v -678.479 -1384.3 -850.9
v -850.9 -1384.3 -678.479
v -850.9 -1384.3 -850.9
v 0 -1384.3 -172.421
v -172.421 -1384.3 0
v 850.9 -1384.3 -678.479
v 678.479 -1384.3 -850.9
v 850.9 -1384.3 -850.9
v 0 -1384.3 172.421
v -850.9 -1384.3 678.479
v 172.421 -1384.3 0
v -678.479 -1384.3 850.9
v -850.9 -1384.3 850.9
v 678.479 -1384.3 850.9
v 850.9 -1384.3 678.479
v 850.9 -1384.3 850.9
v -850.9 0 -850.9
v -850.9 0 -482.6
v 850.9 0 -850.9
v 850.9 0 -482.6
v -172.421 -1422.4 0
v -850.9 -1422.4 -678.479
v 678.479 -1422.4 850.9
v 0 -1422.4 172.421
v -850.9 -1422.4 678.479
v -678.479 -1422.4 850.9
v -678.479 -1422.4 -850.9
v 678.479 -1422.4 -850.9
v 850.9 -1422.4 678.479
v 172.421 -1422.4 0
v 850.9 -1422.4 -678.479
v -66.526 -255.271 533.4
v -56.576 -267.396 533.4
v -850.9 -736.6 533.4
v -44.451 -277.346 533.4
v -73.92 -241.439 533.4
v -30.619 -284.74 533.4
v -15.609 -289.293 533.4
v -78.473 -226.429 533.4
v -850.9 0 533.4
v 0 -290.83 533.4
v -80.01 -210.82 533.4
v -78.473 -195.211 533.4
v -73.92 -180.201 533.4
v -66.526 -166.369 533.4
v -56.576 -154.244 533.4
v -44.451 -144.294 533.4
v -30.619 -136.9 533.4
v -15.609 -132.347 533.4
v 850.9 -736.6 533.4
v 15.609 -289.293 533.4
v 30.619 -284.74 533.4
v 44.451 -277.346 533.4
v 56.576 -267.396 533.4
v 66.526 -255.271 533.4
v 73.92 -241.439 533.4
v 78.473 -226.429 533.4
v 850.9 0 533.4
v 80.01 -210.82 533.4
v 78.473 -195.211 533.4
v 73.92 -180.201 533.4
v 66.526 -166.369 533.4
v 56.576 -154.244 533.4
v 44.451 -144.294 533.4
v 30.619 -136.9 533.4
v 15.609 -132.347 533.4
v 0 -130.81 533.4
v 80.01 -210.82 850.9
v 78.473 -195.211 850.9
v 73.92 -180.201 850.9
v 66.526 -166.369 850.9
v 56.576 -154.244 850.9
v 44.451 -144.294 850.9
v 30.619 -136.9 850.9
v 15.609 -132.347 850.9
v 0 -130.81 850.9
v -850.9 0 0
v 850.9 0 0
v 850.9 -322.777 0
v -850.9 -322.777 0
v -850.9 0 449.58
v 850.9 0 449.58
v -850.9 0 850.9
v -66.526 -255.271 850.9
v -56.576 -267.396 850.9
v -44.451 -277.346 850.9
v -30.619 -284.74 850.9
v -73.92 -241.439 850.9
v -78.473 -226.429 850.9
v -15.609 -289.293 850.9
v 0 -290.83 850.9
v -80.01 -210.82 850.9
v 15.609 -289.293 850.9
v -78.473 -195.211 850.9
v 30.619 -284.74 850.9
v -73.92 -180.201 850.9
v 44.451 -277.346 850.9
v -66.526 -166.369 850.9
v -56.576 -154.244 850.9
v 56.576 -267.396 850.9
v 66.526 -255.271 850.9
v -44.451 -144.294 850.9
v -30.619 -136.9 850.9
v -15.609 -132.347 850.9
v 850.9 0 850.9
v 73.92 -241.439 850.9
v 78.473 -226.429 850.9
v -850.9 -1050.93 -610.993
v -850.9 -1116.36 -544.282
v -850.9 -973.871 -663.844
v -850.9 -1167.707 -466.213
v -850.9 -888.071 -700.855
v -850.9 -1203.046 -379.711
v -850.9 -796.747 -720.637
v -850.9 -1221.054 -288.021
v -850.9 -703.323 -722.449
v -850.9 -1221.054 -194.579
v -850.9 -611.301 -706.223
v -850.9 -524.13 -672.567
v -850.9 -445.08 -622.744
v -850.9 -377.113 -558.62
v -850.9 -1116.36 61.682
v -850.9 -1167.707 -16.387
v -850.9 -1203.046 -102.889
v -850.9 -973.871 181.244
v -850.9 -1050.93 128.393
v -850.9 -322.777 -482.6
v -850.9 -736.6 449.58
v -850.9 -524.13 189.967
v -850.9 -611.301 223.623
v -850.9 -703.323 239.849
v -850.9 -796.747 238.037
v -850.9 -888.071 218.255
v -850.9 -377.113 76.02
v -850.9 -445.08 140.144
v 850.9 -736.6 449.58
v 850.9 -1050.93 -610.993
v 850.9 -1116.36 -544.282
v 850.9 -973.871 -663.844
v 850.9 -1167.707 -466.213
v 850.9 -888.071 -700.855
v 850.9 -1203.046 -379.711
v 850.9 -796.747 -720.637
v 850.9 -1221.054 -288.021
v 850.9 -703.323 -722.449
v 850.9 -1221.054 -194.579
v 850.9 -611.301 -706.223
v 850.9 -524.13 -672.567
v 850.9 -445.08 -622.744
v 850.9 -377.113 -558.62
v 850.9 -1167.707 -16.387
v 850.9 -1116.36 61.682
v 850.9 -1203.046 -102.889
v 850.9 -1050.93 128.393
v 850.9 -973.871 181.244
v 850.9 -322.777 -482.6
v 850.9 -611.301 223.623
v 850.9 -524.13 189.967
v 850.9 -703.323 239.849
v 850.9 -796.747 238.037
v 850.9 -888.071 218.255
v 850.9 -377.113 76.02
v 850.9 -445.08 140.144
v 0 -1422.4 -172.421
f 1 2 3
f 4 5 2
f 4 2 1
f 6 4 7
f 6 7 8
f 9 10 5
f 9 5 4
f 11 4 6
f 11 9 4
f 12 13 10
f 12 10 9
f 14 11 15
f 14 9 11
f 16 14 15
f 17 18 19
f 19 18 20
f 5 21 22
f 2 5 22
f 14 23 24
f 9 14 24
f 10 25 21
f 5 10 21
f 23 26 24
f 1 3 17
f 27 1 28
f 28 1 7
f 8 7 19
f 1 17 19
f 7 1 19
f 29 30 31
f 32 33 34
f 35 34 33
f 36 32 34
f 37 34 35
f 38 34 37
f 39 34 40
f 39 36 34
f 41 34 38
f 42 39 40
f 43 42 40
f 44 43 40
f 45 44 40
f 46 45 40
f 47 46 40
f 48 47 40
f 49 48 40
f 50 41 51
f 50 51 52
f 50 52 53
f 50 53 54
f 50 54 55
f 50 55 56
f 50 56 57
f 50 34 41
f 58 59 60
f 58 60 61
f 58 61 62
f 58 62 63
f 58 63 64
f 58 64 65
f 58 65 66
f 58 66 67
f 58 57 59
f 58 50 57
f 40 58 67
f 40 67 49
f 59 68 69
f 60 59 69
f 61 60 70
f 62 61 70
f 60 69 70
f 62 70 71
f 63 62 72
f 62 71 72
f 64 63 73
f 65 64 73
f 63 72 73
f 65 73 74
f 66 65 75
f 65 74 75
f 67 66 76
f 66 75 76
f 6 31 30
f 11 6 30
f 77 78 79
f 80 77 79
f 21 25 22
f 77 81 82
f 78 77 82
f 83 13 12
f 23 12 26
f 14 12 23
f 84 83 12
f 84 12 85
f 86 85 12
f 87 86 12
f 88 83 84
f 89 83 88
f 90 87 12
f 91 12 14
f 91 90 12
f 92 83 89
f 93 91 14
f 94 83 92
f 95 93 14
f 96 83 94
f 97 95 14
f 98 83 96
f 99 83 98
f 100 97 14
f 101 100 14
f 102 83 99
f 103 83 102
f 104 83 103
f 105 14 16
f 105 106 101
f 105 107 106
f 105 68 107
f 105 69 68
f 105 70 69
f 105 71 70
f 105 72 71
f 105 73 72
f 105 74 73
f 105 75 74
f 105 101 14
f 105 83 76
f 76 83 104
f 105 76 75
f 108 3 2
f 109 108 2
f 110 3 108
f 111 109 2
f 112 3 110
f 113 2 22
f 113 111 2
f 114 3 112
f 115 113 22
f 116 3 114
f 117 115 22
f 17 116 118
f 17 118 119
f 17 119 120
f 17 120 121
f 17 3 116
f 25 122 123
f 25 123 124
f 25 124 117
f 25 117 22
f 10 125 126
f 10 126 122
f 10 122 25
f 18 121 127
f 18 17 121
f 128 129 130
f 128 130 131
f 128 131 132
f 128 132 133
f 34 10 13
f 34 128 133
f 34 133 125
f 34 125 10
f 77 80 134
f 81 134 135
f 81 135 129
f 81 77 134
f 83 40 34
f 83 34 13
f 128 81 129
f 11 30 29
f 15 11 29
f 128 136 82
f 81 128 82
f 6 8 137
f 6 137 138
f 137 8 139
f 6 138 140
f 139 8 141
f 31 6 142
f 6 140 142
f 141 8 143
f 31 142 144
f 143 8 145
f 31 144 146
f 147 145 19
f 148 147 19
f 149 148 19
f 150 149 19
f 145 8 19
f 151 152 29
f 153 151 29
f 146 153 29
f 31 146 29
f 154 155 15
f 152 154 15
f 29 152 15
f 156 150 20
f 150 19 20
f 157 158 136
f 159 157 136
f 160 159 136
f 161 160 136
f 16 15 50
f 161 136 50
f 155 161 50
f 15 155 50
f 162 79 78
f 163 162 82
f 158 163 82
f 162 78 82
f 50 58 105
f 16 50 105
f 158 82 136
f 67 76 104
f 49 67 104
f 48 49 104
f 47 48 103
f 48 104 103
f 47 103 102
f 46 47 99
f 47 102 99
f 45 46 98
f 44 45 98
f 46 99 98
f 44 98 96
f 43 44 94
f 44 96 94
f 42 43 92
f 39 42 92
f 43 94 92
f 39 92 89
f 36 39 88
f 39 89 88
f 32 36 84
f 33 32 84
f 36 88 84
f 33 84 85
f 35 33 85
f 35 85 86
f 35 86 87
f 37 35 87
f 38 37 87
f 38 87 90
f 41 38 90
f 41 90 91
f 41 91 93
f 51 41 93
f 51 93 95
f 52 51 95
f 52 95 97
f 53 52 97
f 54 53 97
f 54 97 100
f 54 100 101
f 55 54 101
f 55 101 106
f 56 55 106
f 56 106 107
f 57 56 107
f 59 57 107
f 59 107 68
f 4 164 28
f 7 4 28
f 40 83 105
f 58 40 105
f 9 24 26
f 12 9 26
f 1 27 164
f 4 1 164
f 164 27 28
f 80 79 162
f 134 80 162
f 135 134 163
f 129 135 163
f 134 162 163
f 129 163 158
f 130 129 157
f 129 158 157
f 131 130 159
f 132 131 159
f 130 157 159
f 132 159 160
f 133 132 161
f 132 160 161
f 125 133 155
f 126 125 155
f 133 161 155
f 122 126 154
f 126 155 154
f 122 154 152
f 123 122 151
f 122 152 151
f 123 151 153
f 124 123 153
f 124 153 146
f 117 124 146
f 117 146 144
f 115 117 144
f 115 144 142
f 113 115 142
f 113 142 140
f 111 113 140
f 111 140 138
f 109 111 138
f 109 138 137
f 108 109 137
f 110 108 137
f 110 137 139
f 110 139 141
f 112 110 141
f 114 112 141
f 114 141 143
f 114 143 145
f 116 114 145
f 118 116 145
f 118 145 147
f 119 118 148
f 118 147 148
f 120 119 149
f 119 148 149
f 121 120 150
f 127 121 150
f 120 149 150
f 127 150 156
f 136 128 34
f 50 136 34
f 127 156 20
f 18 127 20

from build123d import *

# Parameters (mm, degrees)
F0_W     = 1701.8
F0_H     = 1701.8
F1_DEPTH = 1422.4
F3_DEPTH = 38.1
F4_W     = 736.6
F4_H     = 83.82
F5_DEPTH = 1950.72
F7_DEPTH = 2123.44
F9_DEPTH = 383.54


with BuildPart() as f1:
    # F0 (on Front) → F1 (new body)
    with BuildSketch(Plane.XZ):
        Rectangle(F0_W, F0_H)
    extrude(amount=F1_DEPTH)

    # F2 (on face) → F3 (cut)
    with BuildSketch(Plane.XZ.offset(1422.4)):
        Polygon((-850.9, 678.4790824755), (-172.4209175245, 0), (0, 172.4209175245), (-678.4790824755, 850.9), (-850.9, 850.9), align=None)
        Polygon((-172.4209175245, 0), (-850.9, -678.4790824755), (-850.9, -850.9), (-678.4790824755, -850.9), (0, -172.4209175245), align=None)
        Polygon((0, 172.4209175245), (-172.4209175245, 0), (0, -172.4209175245), (172.4209175245, 0), align=None)
        Polygon((678.4790824755, 850.9), (0, 172.4209175245), (172.4209175245, 0), (850.9, 678.4790824755), (850.9, 850.9), align=None)
        Polygon((172.4209175245, 0), (0, -172.4209175245), (678.4790824755, -850.9), (850.9, -850.9), (850.9, -678.4790824755), align=None)
    extrude(amount=-F3_DEPTH, mode=Mode.SUBTRACT)

    # F4 (on face) → F5 (cut)
    with BuildSketch(Plane.YZ.offset(850.9)):
        with Locations((-368.3, 491.49)):
            Rectangle(F4_W, F4_H)
    extrude(amount=-F5_DEPTH, mode=Mode.SUBTRACT)

    # F6 (on face) → F7 (cut)
    with BuildSketch(Plane.YZ.offset(850.9)):
        with BuildLine():
            ThreePointArc((-322.7768453567, -482.6), (-274.564901456, -366.2060711665), (-258.1207052231, -241.3))
            ThreePointArc((-258.1207052231, -241.3), (-274.564901456, -116.3939288335), (-322.7768453567, 0))
            Line((-322.7768453567, 0), (-740.7207052231, 0))
            Line((-740.7207052231, 0), (-740.7207052231, -241.3))
            Line((-740.7207052231, -241.3), (-740.7207052231, -482.6))
            Line((-740.7207052231, -482.6), (-322.7768453567, -482.6))
        make_face()
        with BuildLine():
            ThreePointArc((-322.7768453567, 0), (-274.564901456, -116.3939288335), (-258.1207052231, -241.3))
            ThreePointArc((-258.1207052231, -241.3), (-274.564901456, -366.2060711665), (-322.7768453567, -482.6))
            Line((-322.7768453567, -482.6), (76.7071917653, -482.6))
            Line((76.7071917653, -482.6), (76.7071917653, 0))
            Line((76.7071917653, 0), (-322.7768453567, 0))
        make_face()
        with BuildLine():
            Line((-740.7207052231, 0), (-322.7768453567, 0))
            ThreePointArc((-322.7768453567, 0), (-1223.3207052231, -241.3), (-322.7768453567, -482.6))
            Line((-322.7768453567, -482.6), (-740.7207052231, -482.6))
            Line((-740.7207052231, -482.6), (-740.7207052231, -241.3))
            Line((-740.7207052231, -241.3), (-740.7207052231, 0))
        make_face()
    extrude(amount=-F7_DEPTH, mode=Mode.SUBTRACT)

    # F8 (on face) → F9 (cut)
    with BuildSketch(Plane.XY.offset(850.9)):
        with BuildLine():
            ThreePointArc((0, -130.81), (-56.5756135627, -267.3956135627), (80.01, -210.82))
            ThreePointArc((80.01, -210.82), (56.5756135627, -154.2443864373), (0, -130.81))
        make_face()
    extrude(amount=-F9_DEPTH, mode=Mode.SUBTRACT)


solid = f1.part
